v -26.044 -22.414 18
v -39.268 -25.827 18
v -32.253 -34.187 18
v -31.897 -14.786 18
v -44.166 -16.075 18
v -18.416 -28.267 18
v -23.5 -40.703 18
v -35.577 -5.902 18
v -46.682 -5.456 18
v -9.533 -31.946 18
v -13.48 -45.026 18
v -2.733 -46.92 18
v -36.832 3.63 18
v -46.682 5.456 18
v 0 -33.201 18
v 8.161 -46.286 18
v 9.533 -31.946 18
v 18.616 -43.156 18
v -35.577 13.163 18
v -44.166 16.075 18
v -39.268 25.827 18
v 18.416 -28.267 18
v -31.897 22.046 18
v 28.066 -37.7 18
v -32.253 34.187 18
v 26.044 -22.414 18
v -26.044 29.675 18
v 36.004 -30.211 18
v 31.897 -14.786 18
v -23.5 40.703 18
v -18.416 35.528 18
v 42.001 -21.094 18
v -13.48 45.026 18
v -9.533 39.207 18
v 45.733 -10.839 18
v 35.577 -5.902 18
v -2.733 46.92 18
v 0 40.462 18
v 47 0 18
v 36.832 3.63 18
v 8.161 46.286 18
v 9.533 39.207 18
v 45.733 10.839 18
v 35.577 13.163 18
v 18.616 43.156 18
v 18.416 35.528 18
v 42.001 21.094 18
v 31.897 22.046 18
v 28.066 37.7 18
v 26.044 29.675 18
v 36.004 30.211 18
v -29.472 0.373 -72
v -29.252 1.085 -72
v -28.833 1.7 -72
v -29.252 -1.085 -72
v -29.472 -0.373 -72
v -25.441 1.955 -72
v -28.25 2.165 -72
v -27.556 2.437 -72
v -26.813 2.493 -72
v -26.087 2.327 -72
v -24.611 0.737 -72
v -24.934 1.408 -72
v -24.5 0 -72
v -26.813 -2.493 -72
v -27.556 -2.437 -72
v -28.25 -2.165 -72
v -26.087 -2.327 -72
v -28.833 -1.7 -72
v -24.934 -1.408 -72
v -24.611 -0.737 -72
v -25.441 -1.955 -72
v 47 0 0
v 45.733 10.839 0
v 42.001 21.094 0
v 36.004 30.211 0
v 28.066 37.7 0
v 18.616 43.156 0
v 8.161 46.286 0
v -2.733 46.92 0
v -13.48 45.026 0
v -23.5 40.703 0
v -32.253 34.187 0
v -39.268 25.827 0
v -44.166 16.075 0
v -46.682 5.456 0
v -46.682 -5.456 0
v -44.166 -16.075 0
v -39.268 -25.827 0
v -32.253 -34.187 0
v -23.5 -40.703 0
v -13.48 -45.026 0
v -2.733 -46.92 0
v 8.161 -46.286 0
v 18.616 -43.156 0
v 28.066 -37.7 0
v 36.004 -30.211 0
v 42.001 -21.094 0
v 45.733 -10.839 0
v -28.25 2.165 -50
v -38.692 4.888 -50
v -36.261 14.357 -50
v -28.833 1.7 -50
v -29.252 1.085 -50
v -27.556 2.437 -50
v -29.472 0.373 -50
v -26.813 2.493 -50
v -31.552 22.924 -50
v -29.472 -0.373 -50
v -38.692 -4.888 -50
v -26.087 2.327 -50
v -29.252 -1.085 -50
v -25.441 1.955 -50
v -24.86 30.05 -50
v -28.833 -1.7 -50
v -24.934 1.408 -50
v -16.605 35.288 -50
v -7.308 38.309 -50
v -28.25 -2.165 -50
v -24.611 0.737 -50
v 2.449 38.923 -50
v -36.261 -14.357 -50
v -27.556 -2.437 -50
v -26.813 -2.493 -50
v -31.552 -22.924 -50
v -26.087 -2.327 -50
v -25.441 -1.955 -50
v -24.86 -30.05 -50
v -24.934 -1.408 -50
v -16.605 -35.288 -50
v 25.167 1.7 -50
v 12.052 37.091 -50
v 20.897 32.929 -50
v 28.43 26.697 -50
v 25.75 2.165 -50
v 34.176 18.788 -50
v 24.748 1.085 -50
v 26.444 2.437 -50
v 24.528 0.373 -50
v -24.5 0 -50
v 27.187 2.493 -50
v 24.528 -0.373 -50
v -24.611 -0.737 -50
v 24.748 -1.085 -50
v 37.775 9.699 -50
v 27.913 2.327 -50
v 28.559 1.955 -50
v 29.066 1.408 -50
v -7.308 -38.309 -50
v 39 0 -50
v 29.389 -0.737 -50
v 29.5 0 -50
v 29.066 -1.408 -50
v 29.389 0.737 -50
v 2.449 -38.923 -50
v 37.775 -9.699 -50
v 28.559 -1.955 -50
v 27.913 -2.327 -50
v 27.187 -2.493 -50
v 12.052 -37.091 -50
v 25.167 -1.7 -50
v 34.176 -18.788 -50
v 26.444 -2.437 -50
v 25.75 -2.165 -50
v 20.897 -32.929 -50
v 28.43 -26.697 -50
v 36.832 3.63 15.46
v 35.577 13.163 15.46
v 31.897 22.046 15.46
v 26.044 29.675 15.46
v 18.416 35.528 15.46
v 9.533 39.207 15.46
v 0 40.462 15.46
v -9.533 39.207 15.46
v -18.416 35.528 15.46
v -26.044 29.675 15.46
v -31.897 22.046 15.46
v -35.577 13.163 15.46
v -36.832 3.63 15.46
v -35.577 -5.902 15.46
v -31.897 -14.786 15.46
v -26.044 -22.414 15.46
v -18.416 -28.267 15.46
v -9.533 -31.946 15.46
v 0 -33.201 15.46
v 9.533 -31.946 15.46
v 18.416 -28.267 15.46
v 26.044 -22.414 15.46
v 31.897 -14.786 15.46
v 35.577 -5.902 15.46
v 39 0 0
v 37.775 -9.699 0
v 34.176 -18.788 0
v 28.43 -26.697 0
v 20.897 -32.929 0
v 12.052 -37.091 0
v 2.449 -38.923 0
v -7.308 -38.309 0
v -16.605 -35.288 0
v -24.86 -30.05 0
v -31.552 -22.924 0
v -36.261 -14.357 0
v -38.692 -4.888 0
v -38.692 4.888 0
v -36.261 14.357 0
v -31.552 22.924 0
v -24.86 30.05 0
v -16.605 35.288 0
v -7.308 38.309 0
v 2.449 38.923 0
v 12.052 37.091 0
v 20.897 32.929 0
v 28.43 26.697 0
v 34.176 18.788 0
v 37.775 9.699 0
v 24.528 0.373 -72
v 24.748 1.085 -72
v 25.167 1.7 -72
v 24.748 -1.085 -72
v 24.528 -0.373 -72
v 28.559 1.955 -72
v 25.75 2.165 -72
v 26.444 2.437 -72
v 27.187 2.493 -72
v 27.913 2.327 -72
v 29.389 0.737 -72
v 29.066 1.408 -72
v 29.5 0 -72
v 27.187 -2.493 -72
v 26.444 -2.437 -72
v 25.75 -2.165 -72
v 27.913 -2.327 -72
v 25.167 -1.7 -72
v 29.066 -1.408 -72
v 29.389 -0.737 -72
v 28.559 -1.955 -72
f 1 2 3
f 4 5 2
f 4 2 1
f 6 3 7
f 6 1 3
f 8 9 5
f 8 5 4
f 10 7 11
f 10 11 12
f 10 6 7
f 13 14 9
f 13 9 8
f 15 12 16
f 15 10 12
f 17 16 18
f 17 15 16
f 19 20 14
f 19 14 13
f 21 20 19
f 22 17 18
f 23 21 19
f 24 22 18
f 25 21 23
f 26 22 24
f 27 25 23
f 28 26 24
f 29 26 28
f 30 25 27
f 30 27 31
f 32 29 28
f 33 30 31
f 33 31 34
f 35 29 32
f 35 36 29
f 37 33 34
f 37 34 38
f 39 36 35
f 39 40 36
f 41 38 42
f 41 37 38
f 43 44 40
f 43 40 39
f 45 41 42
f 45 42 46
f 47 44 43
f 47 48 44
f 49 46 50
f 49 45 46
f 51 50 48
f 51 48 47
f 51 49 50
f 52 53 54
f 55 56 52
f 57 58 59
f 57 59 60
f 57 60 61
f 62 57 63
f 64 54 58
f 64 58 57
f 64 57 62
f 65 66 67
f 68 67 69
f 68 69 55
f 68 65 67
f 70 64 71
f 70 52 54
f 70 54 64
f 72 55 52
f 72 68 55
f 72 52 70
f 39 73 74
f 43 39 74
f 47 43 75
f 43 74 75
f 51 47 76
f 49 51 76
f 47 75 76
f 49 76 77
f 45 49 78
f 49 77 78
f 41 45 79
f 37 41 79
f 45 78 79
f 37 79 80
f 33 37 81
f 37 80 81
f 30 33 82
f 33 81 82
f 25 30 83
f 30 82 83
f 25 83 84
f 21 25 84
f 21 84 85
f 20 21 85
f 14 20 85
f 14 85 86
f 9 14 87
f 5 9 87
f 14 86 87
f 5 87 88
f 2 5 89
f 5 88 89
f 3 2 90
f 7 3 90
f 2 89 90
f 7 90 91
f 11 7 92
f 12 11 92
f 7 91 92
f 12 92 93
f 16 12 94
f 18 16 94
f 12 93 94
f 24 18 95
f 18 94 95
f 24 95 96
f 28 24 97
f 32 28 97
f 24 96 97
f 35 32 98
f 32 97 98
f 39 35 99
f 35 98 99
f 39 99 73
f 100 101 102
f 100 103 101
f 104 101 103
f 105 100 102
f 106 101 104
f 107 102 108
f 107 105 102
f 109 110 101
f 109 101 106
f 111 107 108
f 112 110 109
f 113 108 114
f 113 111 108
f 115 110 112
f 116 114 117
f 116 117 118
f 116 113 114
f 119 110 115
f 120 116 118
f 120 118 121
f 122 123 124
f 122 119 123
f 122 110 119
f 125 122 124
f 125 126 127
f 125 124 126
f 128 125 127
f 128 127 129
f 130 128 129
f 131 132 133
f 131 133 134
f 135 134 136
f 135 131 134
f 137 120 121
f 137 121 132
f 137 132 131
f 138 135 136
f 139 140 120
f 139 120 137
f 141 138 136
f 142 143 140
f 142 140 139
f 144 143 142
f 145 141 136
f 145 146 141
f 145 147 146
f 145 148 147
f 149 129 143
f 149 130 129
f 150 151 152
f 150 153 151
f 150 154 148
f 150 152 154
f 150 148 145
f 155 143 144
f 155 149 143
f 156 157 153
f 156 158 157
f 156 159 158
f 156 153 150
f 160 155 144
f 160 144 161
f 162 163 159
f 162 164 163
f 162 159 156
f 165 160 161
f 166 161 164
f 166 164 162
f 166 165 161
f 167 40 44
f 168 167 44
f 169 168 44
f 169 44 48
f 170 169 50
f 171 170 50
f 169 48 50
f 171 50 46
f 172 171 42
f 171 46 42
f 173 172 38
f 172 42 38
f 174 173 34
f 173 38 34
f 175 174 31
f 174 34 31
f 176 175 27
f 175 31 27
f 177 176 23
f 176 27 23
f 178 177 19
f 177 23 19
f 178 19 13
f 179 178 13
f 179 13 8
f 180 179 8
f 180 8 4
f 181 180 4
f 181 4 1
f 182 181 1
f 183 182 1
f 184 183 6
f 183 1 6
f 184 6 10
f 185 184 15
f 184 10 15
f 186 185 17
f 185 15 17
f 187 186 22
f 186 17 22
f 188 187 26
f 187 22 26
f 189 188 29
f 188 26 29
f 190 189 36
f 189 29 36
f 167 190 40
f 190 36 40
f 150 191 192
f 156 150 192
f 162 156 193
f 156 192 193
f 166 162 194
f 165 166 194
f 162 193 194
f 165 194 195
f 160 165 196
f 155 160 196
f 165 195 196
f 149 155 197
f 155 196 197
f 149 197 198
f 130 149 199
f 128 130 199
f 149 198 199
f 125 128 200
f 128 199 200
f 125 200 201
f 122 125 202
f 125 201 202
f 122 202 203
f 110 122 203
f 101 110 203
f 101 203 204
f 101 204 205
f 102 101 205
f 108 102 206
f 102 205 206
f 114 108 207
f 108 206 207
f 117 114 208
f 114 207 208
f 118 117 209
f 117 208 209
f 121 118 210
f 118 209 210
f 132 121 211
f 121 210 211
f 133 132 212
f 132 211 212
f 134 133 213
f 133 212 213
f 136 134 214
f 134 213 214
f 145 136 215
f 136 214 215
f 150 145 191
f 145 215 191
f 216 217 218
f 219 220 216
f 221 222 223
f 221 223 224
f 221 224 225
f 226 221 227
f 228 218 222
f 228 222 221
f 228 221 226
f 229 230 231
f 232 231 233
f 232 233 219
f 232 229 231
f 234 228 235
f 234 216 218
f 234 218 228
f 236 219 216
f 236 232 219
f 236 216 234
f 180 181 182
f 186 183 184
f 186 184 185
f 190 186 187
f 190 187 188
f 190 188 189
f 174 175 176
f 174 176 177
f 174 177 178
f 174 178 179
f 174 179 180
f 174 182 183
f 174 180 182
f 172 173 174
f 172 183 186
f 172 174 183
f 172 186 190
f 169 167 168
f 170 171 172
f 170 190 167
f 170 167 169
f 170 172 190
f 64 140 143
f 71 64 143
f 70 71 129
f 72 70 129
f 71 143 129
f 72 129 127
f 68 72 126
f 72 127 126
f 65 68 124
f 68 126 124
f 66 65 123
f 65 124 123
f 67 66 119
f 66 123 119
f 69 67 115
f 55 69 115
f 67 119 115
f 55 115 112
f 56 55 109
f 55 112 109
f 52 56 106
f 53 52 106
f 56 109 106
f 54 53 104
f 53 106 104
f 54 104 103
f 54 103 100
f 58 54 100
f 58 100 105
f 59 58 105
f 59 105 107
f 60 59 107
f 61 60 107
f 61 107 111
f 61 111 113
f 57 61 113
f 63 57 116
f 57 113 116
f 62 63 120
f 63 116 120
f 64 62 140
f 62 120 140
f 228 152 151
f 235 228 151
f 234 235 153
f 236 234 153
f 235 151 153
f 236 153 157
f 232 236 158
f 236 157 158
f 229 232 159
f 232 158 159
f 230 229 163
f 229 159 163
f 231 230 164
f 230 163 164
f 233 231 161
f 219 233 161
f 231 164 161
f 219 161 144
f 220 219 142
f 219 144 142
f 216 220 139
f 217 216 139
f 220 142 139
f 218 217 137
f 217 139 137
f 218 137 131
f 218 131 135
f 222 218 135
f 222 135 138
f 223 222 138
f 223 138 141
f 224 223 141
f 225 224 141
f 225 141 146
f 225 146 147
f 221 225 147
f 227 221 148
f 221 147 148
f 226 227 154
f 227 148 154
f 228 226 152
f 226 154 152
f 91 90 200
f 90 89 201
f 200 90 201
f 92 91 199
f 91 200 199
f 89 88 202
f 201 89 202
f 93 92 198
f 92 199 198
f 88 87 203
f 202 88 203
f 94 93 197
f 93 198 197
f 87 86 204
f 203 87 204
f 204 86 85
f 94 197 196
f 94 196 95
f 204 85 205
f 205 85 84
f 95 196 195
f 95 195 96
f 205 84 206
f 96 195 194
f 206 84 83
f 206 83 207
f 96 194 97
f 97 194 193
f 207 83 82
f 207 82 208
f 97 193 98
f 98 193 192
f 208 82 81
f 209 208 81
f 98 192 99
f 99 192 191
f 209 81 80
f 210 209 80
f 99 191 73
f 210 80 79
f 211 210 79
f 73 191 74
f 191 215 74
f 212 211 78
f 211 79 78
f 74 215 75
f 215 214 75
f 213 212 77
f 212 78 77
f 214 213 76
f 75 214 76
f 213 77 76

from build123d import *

# Parameters (mm, degrees)
F0_R     = 47
F1_DEPTH = 18
F2_R     = 39
F3_DEPTH = 50
F4_R     = 2.5
F5_DEPTH = 22
F6_R     = 36.831923
F7_DEPTH = 2.54


with BuildPart() as f1:
    # F0 (on Top) → F1 (new body)
    with BuildSketch(Plane.XY):
        Circle(F0_R)
    extrude(amount=F1_DEPTH)

    # F2 (on face) → F3 (join)
    with BuildSketch(Plane(origin=(0, 0, 0), x_dir=(1, 0, 0), z_dir=(0, 0, -1))):
        Circle(F2_R)
    extrude(amount=F3_DEPTH)

    # F4 (on face) → F5 (join)
    with BuildSketch(Plane(origin=(0, 0, -50), x_dir=(1, 0, 0), z_dir=(0, 0, -1))):
        with Locations((-27, 0)):
            Circle(F4_R)
        with Locations((26.999997, 0)):
            Circle(F4_R)
    extrude(amount=F5_DEPTH)

    # F6 (on face) → F7 (cut)
    with BuildSketch(Plane.XY.offset(18)):
        with Locations((0, 3.63045)):
            Circle(F6_R)
    extrude(amount=-F7_DEPTH, mode=Mode.SUBTRACT)


solid = f1.part
